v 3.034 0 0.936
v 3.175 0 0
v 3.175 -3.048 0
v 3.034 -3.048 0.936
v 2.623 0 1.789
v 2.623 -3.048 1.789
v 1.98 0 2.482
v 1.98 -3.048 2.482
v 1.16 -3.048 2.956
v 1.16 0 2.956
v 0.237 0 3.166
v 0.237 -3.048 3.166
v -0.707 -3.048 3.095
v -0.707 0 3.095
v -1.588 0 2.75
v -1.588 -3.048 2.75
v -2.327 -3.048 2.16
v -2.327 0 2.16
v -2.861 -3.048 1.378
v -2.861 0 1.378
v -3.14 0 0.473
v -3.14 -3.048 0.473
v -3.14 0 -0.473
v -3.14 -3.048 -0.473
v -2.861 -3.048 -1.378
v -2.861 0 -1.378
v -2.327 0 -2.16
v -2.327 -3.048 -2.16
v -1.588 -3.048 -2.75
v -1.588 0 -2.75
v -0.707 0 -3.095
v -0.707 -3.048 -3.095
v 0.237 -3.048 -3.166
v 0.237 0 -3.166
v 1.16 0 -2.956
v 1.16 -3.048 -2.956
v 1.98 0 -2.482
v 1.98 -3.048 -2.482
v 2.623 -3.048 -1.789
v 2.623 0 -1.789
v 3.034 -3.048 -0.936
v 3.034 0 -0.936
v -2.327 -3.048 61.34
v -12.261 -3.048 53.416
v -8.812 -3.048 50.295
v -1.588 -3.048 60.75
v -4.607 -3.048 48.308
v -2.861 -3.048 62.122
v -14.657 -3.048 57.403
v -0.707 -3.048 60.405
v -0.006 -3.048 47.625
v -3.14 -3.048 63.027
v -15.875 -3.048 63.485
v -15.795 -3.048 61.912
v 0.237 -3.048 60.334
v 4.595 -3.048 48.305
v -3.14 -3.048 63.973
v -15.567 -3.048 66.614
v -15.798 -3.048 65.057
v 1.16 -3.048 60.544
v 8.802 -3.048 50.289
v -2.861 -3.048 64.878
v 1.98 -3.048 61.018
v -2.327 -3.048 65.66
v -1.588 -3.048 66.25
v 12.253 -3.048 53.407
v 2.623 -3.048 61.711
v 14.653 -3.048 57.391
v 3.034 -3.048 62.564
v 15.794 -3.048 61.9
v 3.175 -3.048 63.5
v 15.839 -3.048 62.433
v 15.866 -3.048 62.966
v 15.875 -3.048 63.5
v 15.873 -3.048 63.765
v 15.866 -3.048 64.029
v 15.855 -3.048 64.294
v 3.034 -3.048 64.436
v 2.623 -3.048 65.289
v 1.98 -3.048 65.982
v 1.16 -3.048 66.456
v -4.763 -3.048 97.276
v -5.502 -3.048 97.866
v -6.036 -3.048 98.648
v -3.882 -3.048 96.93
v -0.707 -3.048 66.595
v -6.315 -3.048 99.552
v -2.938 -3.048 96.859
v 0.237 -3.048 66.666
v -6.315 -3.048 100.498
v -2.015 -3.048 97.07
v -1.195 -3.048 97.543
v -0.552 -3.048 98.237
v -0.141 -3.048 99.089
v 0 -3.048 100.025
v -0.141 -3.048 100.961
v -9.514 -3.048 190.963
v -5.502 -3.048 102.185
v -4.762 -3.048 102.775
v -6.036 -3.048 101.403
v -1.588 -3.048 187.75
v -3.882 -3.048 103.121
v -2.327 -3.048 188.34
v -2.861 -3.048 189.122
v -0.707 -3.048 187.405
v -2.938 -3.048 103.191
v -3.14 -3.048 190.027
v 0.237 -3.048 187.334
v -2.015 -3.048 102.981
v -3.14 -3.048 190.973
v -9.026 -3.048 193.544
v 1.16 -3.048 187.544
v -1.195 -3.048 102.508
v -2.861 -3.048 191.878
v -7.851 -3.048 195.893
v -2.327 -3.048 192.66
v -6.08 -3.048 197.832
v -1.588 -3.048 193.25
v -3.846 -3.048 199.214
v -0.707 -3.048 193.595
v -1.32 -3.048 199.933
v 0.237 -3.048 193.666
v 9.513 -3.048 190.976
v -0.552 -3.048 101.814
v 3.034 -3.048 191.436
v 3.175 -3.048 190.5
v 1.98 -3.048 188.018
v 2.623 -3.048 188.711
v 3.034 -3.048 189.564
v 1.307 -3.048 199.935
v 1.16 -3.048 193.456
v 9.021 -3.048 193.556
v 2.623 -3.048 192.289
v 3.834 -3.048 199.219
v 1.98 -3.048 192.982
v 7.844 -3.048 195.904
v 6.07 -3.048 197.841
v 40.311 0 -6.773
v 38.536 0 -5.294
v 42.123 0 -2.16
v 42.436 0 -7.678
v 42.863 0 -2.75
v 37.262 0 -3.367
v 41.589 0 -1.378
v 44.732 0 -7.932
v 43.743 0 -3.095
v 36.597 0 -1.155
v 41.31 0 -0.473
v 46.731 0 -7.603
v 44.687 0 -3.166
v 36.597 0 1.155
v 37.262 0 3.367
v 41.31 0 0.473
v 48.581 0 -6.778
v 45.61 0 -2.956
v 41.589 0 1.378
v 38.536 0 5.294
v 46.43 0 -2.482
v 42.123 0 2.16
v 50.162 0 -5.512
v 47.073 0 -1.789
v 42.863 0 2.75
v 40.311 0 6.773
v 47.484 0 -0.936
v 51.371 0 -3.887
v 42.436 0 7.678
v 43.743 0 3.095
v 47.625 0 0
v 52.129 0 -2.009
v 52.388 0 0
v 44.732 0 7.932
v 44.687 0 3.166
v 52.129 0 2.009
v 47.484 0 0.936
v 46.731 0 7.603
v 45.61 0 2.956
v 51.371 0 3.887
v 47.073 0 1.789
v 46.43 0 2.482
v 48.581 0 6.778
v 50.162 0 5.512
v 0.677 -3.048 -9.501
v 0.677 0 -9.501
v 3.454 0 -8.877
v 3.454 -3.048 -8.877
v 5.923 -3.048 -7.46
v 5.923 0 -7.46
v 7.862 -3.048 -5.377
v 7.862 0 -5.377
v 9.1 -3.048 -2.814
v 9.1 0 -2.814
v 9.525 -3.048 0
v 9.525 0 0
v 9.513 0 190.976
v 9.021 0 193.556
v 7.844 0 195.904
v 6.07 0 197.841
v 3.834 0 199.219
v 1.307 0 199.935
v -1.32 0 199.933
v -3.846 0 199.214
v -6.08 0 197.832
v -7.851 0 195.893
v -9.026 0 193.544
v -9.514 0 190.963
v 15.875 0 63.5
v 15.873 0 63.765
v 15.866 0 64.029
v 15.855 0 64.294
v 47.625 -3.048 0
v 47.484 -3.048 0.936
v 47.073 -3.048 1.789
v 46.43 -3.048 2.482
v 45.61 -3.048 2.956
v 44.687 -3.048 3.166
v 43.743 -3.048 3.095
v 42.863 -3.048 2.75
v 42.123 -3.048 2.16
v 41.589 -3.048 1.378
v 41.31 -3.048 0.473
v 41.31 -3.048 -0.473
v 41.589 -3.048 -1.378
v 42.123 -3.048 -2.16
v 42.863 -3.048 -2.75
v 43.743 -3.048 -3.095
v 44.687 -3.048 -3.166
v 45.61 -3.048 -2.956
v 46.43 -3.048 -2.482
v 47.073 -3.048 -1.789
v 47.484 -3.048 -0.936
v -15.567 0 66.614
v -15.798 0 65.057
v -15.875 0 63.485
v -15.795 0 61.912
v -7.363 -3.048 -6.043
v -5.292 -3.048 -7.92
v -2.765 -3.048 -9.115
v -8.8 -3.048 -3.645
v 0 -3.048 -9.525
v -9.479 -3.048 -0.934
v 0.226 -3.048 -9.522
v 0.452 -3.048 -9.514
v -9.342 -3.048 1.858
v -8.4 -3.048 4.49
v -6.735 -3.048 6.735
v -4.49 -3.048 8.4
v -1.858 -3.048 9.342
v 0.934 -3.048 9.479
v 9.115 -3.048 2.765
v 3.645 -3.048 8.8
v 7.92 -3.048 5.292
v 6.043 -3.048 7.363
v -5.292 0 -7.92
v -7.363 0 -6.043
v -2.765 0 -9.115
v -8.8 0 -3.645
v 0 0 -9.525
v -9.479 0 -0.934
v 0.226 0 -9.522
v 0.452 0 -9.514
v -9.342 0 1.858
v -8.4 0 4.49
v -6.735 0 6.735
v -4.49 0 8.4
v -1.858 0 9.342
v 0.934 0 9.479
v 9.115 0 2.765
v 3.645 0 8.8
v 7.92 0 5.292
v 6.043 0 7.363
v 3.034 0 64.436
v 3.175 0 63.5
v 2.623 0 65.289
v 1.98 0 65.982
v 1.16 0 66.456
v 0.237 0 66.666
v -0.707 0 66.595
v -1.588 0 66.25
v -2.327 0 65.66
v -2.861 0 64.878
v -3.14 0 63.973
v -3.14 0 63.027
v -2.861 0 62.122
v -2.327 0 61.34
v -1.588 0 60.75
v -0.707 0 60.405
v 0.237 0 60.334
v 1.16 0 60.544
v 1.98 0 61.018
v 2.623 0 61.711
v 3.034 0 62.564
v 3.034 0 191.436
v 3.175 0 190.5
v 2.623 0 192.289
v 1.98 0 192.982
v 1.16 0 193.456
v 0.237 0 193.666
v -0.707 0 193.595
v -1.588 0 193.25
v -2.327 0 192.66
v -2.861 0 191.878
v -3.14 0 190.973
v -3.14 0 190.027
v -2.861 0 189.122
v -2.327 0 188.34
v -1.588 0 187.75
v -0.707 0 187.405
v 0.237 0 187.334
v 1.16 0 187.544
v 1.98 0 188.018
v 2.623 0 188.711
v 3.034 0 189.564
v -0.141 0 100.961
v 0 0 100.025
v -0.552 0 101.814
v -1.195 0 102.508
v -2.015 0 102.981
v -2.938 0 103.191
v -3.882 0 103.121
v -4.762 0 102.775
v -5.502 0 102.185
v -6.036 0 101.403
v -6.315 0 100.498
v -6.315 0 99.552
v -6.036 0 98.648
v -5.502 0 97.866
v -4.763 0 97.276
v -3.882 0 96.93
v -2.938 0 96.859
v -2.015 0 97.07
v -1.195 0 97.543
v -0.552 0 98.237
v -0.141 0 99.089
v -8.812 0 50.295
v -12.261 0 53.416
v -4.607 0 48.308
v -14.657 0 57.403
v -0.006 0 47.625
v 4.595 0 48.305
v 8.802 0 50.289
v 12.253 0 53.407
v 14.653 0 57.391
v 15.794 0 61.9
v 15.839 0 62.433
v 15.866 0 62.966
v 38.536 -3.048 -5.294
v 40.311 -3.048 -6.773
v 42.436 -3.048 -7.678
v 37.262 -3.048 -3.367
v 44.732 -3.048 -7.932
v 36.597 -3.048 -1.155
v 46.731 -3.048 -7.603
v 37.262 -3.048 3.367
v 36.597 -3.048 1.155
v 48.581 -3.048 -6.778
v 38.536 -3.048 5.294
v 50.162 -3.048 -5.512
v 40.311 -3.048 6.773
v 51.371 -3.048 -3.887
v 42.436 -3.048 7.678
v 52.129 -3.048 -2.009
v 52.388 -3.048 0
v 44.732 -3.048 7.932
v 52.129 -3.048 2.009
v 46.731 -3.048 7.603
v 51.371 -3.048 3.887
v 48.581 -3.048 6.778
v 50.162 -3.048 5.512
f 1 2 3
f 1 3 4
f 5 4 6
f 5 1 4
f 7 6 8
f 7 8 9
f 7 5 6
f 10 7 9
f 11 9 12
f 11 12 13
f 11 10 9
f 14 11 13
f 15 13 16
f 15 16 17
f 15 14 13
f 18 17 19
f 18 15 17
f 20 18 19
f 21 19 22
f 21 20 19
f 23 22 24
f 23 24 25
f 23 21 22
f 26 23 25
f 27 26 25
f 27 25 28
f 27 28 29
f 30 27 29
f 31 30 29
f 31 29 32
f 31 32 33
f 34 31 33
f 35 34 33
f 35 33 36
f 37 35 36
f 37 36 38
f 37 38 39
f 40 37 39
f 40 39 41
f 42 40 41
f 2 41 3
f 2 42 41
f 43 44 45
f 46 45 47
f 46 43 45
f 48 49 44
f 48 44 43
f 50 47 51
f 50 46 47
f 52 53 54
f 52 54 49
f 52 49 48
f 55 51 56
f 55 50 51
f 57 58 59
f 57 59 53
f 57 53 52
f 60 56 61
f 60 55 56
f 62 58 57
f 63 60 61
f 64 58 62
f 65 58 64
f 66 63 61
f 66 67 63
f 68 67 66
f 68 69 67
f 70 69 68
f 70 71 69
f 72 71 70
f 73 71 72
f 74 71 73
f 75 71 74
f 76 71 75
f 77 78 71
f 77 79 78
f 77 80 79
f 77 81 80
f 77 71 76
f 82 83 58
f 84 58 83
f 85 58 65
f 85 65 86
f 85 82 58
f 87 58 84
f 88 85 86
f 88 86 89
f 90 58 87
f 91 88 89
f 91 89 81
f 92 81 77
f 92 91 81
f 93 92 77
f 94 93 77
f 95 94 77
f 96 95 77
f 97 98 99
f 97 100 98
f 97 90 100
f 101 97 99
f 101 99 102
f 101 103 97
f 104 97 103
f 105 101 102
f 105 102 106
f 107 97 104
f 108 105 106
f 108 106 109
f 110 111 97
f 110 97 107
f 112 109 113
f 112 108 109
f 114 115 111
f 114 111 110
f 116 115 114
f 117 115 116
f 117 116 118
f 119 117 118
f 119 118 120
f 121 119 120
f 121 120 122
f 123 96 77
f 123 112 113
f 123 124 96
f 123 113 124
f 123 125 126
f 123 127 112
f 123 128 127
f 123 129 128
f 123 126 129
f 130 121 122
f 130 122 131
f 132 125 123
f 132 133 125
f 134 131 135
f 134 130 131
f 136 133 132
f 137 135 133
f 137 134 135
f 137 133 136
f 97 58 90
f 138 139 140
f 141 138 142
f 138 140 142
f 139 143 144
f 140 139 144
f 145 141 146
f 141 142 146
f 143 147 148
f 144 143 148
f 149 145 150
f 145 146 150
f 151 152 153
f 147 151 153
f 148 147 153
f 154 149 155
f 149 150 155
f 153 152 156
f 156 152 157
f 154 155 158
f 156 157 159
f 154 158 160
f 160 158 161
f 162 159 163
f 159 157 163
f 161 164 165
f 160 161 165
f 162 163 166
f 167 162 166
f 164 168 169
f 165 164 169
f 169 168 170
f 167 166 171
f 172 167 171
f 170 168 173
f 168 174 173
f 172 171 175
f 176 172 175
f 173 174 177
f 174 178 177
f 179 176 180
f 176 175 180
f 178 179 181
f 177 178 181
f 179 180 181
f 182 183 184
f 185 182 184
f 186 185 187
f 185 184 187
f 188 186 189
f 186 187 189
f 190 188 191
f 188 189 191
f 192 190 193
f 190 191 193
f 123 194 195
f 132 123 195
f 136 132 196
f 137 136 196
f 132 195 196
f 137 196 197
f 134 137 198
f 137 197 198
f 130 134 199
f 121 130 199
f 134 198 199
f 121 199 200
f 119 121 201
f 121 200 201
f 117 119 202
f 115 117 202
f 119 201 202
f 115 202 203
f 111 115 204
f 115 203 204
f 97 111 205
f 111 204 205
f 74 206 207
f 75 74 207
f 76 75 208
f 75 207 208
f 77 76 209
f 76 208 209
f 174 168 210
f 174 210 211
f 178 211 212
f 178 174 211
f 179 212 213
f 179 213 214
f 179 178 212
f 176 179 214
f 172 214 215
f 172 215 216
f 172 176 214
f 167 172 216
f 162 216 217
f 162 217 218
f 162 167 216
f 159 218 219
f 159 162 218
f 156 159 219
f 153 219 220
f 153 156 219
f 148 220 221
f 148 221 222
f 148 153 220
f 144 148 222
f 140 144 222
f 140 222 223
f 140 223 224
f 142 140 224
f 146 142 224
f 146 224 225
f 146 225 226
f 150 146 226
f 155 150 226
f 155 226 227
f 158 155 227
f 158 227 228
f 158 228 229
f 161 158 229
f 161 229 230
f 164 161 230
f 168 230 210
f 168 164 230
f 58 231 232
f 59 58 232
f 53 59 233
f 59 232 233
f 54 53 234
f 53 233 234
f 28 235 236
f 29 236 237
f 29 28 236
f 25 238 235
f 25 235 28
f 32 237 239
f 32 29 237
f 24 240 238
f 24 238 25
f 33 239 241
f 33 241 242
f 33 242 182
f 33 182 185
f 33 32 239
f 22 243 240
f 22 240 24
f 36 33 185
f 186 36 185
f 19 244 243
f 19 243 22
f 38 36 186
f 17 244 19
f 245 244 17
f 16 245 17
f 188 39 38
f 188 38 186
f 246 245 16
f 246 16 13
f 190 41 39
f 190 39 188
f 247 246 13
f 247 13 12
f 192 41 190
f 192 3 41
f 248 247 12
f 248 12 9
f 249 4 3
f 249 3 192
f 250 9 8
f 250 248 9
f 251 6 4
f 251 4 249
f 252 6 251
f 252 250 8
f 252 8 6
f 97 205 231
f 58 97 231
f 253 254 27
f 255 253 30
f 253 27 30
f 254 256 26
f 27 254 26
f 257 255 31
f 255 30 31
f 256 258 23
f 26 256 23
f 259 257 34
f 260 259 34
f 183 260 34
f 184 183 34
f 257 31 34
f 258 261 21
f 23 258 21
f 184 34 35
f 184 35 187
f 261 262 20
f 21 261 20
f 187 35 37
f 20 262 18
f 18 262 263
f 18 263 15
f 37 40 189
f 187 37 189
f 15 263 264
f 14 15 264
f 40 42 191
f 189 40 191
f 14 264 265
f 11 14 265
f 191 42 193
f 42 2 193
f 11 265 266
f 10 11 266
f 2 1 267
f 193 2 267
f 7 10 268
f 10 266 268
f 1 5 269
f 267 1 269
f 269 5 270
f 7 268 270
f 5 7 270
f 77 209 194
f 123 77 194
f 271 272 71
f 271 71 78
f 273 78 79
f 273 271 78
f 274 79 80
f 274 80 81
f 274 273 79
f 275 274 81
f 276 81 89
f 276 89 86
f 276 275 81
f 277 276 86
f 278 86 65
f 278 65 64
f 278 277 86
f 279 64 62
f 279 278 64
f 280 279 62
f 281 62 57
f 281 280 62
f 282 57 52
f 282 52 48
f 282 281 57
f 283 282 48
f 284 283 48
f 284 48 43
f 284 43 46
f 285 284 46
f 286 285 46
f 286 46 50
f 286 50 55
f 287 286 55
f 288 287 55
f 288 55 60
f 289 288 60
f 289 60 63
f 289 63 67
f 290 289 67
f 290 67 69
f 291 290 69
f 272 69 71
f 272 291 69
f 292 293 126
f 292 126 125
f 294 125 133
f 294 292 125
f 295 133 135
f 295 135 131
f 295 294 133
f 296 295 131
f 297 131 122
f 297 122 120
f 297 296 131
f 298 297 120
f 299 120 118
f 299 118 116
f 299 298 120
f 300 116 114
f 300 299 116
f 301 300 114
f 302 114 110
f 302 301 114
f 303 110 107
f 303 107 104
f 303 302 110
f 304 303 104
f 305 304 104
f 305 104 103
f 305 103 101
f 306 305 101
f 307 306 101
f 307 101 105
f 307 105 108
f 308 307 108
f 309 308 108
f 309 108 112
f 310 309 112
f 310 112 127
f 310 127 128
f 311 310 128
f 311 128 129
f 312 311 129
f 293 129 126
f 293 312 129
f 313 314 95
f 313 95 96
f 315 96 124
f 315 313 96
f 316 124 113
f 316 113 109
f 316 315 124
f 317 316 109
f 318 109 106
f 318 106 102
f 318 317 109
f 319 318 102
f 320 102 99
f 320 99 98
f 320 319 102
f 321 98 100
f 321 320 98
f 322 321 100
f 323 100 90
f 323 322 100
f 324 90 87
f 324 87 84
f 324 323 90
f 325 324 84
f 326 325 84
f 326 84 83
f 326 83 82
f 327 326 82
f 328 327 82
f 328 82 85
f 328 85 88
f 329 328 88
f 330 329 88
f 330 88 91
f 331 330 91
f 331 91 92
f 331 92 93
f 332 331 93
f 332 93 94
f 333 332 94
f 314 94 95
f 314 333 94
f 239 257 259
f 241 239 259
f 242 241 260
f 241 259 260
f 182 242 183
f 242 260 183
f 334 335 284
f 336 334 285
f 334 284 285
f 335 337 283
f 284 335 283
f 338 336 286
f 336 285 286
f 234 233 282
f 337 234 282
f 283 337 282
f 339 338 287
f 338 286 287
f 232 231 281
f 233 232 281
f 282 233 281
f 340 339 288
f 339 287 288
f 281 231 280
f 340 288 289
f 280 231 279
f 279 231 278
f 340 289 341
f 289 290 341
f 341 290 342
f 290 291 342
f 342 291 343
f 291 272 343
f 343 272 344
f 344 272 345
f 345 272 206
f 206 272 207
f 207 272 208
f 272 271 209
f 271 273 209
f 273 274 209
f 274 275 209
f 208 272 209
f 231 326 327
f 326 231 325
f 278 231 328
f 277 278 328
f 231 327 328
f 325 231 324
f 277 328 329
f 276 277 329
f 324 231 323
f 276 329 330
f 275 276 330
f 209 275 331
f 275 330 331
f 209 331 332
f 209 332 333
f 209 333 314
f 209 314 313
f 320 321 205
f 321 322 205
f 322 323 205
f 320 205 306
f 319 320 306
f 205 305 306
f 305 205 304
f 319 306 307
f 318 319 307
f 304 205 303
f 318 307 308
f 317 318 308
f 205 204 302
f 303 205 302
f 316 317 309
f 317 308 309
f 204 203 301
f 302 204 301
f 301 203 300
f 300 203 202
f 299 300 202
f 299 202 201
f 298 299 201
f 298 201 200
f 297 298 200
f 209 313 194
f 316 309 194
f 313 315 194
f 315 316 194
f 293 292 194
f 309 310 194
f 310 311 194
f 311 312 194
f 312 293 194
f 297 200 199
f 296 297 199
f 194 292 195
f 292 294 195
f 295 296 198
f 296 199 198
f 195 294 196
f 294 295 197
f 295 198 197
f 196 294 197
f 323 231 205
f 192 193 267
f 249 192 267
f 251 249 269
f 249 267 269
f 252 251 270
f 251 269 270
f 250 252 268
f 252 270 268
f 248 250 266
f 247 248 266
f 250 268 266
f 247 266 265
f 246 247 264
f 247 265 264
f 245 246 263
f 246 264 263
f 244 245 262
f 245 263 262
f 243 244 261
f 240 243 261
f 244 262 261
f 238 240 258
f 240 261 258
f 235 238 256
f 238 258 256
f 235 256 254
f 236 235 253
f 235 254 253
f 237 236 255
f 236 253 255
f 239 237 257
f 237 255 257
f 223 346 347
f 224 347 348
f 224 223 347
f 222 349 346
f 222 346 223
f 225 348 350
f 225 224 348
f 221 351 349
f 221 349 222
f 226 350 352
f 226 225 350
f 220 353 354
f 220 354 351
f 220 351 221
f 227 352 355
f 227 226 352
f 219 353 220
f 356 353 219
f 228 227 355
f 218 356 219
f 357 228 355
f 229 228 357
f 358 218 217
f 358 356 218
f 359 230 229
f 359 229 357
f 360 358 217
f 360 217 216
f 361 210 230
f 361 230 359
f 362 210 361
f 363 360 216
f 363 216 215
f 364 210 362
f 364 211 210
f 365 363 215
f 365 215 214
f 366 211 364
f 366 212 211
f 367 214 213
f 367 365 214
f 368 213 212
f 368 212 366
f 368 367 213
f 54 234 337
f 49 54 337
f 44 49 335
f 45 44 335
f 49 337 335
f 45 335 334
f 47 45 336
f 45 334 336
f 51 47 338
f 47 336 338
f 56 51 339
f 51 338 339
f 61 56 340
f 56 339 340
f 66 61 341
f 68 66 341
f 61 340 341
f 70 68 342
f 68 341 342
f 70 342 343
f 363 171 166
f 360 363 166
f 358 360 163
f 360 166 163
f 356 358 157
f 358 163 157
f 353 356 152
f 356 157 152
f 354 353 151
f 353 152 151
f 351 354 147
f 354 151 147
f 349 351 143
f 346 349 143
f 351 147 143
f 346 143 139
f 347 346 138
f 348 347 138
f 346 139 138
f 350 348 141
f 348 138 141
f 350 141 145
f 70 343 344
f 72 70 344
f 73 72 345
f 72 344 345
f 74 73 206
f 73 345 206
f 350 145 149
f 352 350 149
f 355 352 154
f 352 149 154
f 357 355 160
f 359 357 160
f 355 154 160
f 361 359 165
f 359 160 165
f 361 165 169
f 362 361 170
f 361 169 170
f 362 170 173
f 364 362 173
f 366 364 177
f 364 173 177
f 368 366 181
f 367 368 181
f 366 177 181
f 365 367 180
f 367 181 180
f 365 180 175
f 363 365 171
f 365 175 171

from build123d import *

# Parameters (mm, degrees)
F0_R     = 3.175
F1_DEPTH = 3.048


with BuildPart() as f1:
    # F0 (on Front) → F1 (new body)
    with BuildSketch(Plane.XZ):
        with BuildLine():
            Line((0.6773435479, -9.500885786), (0, -9.525))
            ThreePointArc((0, -9.525), (0.3388863295, -9.5189695375), (0.6773435479, -9.500885786))
        make_face()
        with BuildLine():
            ThreePointArc((0.6773435479, -9.500885786), (6.9705567315, -6.4912990883), (9.525, 0))
            ThreePointArc((9.525, 0), (-6.7351920908, 6.7351920908), (0, -9.525))
            Line((0, -9.525), (0.6773435479, -9.500885786))
        make_face()
        Circle(F0_R, mode=Mode.SUBTRACT)
    extrude(amount=F1_DEPTH)


with BuildPart() as f1b:
    # F0 (on Front) → F1, piece 2 (new body)
    with BuildSketch(Plane.XZ):
        with BuildLine():
            ThreePointArc((-15.5665705131, 66.6140821219), (-15.8562264772, 64.2718205117), (-15.7954255641, 61.9125))
            Line((-15.7954255641, 61.9125), (-15.5665705131, 66.6140821219))
        make_face()
        with BuildLine():
            ThreePointArc((9.5130862993, 190.97625), (-0.006586859, 200.0249977225), (-9.5137358863, 190.963092307))
            ThreePointArc((-9.5137358863, 190.963092307), (-0.2316146396, 180.9778164448), (9.525, 190.5))
            ThreePointArc((9.525, 190.5), (9.522021109, 190.7381994956), (9.5130862993, 190.97625))
        make_face()
        with Locations((0, 190.5)):
            Circle(F0_R, mode=Mode.SUBTRACT)
        with BuildLine():
            ThreePointArc((-15.7954255641, 61.9125), (-0.0060905531, 47.6250011683), (15.7942028036, 61.9003804205))
            ThreePointArc((15.7942028036, 61.9003804205), (15.8547878338, 62.6991705884), (15.875, 63.5))
            ThreePointArc((15.875, 63.5), (15.8700351817, 63.8969991593), (15.8551438321, 64.29375))
            ThreePointArc((15.8551438321, 64.29375), (1.1691039, 79.3318925297), (-15.5665705131, 66.6140821219))
            Line((-15.5665705131, 66.6140821219), (-15.7954255641, 61.9125))
        make_face()
        with Locations((0, 63.5)):
            Circle(F0_R, mode=Mode.SUBTRACT)
        with BuildLine():
            Line((-9.5137358863, 190.963092307), (-15.5665705131, 66.6140821219))
            ThreePointArc((-15.5665705131, 66.6140821219), (1.1691039, 79.3318925297), (15.8551438321, 64.29375))
            Line((15.8551438321, 64.29375), (9.5130862993, 190.97625))
            ThreePointArc((9.5130862993, 190.97625), (9.522021109, 190.7381994956), (9.525, 190.5))
            ThreePointArc((9.525, 190.5), (-0.2316146396, 180.9778164448), (-9.5137358863, 190.963092307))
        make_face()
        with Locations((-3.175, 100.0252)):
            Circle(F0_R, mode=Mode.SUBTRACT)
    extrude(amount=F1_DEPTH)


with BuildPart() as f1c:
    # F0 (on Front) → F1, piece 3 (new body)
    with BuildSketch(Plane.XZ):
        with BuildLine():
            ThreePointArc((44.7324052746, 7.9324746146), (36.5125, 0), (44.7324052746, -7.9324746146))
            ThreePointArc((44.7324052746, -7.9324746146), (50.1616327839, -5.5119104847), (52.3875, 0))
            ThreePointArc((52.3875, 0), (50.1616327839, 5.5119104847), (44.7324052746, 7.9324746146))
        make_face()
        with Locations((44.45, 0)):
            Circle(F0_R, mode=Mode.SUBTRACT)
    extrude(amount=F1_DEPTH)


solid = Compound([f1.part, f1b.part, f1c.part])
